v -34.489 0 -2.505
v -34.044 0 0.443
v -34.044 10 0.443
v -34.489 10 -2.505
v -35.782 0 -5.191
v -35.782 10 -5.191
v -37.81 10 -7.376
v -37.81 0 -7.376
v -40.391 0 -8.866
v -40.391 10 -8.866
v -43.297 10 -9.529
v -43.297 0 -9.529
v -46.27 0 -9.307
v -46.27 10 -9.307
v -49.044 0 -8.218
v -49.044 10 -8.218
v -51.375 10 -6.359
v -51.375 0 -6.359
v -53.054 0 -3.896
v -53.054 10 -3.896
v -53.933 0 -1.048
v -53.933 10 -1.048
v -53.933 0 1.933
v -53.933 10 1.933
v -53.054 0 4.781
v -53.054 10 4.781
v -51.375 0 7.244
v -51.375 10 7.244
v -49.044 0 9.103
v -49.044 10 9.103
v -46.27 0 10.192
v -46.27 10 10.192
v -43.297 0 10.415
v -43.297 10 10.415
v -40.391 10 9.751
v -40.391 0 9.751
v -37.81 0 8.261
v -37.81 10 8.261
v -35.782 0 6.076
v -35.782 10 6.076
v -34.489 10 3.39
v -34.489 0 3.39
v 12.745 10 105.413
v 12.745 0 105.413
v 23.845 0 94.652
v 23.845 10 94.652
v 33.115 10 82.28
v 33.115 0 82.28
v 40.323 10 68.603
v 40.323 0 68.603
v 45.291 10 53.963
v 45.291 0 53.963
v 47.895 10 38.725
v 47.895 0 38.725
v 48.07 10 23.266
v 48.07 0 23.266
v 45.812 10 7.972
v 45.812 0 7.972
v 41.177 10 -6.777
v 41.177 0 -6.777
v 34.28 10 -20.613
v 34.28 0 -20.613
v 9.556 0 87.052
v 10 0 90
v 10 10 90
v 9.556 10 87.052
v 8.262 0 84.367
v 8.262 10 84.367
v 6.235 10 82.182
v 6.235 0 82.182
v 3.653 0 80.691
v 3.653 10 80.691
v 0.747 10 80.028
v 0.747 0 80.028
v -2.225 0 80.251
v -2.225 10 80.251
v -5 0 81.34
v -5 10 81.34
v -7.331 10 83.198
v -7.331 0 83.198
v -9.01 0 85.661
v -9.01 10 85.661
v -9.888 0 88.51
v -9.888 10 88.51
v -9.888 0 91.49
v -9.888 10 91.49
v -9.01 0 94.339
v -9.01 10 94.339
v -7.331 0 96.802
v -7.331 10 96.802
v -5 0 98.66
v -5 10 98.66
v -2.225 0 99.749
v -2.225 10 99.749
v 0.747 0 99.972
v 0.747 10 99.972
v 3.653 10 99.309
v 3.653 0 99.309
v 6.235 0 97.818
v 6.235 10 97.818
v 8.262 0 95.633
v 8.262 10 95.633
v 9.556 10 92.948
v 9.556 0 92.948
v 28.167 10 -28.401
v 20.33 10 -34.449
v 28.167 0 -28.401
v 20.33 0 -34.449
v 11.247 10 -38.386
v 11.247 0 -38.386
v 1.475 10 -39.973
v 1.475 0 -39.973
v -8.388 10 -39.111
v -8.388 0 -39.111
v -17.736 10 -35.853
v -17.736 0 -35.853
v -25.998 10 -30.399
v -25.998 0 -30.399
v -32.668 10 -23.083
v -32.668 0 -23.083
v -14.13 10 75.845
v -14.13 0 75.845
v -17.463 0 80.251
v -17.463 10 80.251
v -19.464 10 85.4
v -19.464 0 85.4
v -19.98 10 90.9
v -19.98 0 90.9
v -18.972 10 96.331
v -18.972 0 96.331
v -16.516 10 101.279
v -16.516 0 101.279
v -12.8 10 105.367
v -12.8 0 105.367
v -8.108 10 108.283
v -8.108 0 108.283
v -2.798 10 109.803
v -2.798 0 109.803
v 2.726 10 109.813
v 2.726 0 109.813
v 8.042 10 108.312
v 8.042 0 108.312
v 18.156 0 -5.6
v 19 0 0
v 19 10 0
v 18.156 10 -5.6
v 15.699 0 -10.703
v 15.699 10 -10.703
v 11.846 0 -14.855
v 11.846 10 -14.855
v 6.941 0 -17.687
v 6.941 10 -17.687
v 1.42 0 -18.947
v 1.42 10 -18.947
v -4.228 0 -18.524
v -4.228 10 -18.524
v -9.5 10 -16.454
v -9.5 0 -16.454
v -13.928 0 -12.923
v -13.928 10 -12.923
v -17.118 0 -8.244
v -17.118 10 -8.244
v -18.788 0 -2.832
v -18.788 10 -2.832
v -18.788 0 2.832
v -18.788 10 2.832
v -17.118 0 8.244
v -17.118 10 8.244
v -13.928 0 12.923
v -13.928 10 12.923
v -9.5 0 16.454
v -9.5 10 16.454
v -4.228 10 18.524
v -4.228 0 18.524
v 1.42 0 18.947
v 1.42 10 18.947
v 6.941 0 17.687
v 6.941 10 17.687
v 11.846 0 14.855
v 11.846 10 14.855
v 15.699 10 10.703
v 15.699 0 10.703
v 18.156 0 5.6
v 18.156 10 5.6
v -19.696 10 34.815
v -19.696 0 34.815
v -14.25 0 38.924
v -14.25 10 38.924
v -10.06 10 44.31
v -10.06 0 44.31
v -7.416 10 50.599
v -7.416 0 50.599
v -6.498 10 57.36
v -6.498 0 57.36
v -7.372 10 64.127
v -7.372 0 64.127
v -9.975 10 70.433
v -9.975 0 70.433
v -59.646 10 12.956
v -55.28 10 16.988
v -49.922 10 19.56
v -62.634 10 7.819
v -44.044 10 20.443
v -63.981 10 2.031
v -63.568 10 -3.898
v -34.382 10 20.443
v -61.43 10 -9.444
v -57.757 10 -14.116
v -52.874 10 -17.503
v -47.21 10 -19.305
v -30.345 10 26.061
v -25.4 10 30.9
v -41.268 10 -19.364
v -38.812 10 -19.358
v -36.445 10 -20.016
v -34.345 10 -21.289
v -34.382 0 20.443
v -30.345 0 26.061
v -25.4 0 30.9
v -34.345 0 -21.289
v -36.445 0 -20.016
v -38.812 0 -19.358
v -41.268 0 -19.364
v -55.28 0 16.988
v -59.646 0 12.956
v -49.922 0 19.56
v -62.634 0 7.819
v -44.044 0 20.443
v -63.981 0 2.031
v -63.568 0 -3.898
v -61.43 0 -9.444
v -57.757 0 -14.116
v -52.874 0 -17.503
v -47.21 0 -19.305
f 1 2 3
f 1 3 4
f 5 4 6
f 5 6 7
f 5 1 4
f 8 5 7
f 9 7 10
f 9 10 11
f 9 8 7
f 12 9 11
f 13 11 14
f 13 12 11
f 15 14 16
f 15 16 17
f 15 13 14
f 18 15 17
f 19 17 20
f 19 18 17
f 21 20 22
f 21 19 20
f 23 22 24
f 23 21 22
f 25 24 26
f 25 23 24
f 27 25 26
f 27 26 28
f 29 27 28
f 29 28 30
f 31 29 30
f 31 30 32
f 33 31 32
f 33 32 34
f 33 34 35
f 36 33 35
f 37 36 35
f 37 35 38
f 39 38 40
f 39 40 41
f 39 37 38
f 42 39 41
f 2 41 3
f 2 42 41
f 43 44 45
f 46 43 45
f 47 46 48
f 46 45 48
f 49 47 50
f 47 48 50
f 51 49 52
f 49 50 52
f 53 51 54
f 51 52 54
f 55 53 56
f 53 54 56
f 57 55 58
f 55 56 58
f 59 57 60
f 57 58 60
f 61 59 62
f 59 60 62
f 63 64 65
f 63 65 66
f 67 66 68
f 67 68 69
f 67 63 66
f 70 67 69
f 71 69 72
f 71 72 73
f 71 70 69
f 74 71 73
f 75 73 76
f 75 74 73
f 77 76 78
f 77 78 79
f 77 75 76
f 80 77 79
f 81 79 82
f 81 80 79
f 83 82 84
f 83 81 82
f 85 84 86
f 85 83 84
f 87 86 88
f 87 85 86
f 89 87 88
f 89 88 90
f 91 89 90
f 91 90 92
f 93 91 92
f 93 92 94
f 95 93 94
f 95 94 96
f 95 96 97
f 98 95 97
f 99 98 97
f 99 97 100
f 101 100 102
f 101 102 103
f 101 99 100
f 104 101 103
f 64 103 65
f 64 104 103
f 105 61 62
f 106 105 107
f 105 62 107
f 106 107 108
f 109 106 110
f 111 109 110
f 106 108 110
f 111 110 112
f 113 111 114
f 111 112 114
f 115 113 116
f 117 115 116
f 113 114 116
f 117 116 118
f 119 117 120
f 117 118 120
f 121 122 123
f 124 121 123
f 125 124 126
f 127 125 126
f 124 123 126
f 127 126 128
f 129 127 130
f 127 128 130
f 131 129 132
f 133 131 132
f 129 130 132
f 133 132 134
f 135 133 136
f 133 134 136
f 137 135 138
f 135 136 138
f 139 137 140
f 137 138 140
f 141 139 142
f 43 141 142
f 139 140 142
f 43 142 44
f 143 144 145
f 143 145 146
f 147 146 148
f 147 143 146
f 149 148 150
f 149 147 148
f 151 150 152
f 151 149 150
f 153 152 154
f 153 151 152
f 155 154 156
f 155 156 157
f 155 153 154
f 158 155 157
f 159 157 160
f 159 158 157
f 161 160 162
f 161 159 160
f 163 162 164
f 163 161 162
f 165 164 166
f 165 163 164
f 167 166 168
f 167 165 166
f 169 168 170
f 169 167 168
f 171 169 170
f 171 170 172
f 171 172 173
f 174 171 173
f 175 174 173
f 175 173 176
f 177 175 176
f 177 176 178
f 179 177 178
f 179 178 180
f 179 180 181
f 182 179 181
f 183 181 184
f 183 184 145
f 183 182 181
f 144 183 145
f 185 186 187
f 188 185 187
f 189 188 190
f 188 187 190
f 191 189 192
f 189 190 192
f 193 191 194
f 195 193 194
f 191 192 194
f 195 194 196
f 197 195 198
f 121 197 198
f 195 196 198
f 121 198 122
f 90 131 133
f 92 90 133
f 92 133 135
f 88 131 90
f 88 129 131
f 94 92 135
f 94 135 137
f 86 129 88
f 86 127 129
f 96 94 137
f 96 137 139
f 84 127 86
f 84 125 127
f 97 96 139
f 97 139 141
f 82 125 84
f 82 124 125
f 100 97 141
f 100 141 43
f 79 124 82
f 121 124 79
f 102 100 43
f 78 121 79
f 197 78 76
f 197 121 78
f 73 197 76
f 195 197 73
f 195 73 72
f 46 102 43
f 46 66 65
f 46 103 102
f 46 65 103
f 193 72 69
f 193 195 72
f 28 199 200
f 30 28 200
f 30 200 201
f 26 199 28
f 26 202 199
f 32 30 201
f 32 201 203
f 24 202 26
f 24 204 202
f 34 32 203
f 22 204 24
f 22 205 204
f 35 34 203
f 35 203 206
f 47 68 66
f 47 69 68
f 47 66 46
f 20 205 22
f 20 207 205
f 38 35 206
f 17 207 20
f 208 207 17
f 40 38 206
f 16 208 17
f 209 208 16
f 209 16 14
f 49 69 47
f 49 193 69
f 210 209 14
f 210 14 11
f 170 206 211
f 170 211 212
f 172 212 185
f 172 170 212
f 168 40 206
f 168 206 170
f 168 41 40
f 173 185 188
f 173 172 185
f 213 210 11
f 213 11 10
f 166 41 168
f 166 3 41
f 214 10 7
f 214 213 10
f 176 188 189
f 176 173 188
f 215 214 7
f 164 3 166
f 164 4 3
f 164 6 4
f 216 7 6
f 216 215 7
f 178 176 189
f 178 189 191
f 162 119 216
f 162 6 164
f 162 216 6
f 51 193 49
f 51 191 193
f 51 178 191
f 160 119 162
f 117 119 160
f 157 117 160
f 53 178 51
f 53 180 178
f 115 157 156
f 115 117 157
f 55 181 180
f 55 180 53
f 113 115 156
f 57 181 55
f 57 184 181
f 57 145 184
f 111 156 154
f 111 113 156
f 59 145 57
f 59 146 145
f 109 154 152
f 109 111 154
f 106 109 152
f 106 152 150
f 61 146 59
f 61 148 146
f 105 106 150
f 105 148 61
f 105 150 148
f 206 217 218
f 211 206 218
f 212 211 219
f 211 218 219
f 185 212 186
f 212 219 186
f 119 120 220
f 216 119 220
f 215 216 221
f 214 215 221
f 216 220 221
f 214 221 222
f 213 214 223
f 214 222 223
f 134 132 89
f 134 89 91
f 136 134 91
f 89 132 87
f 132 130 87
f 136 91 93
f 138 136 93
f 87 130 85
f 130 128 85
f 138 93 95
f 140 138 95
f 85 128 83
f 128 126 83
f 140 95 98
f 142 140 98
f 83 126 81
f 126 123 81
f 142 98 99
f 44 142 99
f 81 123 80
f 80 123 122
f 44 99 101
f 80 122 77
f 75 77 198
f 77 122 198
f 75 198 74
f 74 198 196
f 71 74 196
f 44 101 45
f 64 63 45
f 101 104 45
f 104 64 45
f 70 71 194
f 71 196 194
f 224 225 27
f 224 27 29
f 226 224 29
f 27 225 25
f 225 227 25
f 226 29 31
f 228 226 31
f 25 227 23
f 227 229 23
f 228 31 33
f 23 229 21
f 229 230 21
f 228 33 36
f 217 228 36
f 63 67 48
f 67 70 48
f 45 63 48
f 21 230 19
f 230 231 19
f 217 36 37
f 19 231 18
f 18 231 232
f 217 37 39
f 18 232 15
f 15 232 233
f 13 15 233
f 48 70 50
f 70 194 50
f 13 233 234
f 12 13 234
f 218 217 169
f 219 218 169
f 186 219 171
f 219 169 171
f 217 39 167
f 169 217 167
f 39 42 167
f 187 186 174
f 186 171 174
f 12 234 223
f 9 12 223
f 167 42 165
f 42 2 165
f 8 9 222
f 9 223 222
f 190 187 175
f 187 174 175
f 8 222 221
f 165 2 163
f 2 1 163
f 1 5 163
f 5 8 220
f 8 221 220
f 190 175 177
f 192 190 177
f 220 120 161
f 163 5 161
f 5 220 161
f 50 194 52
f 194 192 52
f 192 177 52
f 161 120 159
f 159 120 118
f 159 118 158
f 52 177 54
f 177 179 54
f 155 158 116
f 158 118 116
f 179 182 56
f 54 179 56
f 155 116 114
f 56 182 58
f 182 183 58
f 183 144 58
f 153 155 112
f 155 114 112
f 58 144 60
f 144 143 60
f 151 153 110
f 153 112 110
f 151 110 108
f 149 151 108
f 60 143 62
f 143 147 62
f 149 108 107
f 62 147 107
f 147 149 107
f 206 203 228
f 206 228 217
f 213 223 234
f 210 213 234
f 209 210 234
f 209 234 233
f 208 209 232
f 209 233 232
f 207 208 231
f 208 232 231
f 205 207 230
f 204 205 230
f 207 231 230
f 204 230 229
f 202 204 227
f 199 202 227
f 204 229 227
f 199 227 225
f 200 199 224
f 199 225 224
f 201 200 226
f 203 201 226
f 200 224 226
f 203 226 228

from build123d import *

# Parameters (mm, degrees)
SKETCH7_R           = 10
SKETCH7_R_2         = 19
BOSS_EXTRUDE7_DEPTH = 10


with BuildPart() as part:
    # Sketch7 → Boss-Extrude7 (new body)
    with BuildSketch(Plane(origin=(0, 0, 0), x_dir=(1, 0, 0), z_dir=(0, 1, 0))):
        with BuildLine():
            ThreePointArc((12.745045372, -105.413105413), (46.894193375, -46.39540437), (34.279777206, 20.61302682))
            ThreePointArc((34.279777206, 20.61302682), (1.47471049, 39.972806118), (-32.667709838, 23.082909998))
            ThreePointArc((-32.667709838, 23.082909998), (-36.445484769, 20.015963612), (-41.267553362, 19.363738157))
            ThreePointArc((-41.267553362, 19.363738157), (-63.99597338, 0.949285461), (-44.044461831, -20.442543154))
            Line((-44.044461831, -20.442543154), (-34.381716499, -20.442543154))
            ThreePointArc((-34.381716499, -20.442543154), (-27.977452206, -28.587797538), (-19.695904889, -34.814814815))
            ThreePointArc((-19.695904889, -34.814814815), (-6.734239862, -53.9492851), (-14.129670899, -75.845410628))
            ThreePointArc((-14.129670899, -75.845410628), (-14.800048672, -103.452083828), (12.745045372, -105.413105413))
        make_face()
        with Locations((-44.044461831, -0.442543154)):
            Circle(SKETCH7_R, mode=Mode.SUBTRACT)
        Circle(SKETCH7_R_2, mode=Mode.SUBTRACT)
        with Locations((0, -90)):
            Circle(SKETCH7_R, mode=Mode.SUBTRACT)
    extrude(amount=BOSS_EXTRUDE7_DEPTH)


solid = part.part
